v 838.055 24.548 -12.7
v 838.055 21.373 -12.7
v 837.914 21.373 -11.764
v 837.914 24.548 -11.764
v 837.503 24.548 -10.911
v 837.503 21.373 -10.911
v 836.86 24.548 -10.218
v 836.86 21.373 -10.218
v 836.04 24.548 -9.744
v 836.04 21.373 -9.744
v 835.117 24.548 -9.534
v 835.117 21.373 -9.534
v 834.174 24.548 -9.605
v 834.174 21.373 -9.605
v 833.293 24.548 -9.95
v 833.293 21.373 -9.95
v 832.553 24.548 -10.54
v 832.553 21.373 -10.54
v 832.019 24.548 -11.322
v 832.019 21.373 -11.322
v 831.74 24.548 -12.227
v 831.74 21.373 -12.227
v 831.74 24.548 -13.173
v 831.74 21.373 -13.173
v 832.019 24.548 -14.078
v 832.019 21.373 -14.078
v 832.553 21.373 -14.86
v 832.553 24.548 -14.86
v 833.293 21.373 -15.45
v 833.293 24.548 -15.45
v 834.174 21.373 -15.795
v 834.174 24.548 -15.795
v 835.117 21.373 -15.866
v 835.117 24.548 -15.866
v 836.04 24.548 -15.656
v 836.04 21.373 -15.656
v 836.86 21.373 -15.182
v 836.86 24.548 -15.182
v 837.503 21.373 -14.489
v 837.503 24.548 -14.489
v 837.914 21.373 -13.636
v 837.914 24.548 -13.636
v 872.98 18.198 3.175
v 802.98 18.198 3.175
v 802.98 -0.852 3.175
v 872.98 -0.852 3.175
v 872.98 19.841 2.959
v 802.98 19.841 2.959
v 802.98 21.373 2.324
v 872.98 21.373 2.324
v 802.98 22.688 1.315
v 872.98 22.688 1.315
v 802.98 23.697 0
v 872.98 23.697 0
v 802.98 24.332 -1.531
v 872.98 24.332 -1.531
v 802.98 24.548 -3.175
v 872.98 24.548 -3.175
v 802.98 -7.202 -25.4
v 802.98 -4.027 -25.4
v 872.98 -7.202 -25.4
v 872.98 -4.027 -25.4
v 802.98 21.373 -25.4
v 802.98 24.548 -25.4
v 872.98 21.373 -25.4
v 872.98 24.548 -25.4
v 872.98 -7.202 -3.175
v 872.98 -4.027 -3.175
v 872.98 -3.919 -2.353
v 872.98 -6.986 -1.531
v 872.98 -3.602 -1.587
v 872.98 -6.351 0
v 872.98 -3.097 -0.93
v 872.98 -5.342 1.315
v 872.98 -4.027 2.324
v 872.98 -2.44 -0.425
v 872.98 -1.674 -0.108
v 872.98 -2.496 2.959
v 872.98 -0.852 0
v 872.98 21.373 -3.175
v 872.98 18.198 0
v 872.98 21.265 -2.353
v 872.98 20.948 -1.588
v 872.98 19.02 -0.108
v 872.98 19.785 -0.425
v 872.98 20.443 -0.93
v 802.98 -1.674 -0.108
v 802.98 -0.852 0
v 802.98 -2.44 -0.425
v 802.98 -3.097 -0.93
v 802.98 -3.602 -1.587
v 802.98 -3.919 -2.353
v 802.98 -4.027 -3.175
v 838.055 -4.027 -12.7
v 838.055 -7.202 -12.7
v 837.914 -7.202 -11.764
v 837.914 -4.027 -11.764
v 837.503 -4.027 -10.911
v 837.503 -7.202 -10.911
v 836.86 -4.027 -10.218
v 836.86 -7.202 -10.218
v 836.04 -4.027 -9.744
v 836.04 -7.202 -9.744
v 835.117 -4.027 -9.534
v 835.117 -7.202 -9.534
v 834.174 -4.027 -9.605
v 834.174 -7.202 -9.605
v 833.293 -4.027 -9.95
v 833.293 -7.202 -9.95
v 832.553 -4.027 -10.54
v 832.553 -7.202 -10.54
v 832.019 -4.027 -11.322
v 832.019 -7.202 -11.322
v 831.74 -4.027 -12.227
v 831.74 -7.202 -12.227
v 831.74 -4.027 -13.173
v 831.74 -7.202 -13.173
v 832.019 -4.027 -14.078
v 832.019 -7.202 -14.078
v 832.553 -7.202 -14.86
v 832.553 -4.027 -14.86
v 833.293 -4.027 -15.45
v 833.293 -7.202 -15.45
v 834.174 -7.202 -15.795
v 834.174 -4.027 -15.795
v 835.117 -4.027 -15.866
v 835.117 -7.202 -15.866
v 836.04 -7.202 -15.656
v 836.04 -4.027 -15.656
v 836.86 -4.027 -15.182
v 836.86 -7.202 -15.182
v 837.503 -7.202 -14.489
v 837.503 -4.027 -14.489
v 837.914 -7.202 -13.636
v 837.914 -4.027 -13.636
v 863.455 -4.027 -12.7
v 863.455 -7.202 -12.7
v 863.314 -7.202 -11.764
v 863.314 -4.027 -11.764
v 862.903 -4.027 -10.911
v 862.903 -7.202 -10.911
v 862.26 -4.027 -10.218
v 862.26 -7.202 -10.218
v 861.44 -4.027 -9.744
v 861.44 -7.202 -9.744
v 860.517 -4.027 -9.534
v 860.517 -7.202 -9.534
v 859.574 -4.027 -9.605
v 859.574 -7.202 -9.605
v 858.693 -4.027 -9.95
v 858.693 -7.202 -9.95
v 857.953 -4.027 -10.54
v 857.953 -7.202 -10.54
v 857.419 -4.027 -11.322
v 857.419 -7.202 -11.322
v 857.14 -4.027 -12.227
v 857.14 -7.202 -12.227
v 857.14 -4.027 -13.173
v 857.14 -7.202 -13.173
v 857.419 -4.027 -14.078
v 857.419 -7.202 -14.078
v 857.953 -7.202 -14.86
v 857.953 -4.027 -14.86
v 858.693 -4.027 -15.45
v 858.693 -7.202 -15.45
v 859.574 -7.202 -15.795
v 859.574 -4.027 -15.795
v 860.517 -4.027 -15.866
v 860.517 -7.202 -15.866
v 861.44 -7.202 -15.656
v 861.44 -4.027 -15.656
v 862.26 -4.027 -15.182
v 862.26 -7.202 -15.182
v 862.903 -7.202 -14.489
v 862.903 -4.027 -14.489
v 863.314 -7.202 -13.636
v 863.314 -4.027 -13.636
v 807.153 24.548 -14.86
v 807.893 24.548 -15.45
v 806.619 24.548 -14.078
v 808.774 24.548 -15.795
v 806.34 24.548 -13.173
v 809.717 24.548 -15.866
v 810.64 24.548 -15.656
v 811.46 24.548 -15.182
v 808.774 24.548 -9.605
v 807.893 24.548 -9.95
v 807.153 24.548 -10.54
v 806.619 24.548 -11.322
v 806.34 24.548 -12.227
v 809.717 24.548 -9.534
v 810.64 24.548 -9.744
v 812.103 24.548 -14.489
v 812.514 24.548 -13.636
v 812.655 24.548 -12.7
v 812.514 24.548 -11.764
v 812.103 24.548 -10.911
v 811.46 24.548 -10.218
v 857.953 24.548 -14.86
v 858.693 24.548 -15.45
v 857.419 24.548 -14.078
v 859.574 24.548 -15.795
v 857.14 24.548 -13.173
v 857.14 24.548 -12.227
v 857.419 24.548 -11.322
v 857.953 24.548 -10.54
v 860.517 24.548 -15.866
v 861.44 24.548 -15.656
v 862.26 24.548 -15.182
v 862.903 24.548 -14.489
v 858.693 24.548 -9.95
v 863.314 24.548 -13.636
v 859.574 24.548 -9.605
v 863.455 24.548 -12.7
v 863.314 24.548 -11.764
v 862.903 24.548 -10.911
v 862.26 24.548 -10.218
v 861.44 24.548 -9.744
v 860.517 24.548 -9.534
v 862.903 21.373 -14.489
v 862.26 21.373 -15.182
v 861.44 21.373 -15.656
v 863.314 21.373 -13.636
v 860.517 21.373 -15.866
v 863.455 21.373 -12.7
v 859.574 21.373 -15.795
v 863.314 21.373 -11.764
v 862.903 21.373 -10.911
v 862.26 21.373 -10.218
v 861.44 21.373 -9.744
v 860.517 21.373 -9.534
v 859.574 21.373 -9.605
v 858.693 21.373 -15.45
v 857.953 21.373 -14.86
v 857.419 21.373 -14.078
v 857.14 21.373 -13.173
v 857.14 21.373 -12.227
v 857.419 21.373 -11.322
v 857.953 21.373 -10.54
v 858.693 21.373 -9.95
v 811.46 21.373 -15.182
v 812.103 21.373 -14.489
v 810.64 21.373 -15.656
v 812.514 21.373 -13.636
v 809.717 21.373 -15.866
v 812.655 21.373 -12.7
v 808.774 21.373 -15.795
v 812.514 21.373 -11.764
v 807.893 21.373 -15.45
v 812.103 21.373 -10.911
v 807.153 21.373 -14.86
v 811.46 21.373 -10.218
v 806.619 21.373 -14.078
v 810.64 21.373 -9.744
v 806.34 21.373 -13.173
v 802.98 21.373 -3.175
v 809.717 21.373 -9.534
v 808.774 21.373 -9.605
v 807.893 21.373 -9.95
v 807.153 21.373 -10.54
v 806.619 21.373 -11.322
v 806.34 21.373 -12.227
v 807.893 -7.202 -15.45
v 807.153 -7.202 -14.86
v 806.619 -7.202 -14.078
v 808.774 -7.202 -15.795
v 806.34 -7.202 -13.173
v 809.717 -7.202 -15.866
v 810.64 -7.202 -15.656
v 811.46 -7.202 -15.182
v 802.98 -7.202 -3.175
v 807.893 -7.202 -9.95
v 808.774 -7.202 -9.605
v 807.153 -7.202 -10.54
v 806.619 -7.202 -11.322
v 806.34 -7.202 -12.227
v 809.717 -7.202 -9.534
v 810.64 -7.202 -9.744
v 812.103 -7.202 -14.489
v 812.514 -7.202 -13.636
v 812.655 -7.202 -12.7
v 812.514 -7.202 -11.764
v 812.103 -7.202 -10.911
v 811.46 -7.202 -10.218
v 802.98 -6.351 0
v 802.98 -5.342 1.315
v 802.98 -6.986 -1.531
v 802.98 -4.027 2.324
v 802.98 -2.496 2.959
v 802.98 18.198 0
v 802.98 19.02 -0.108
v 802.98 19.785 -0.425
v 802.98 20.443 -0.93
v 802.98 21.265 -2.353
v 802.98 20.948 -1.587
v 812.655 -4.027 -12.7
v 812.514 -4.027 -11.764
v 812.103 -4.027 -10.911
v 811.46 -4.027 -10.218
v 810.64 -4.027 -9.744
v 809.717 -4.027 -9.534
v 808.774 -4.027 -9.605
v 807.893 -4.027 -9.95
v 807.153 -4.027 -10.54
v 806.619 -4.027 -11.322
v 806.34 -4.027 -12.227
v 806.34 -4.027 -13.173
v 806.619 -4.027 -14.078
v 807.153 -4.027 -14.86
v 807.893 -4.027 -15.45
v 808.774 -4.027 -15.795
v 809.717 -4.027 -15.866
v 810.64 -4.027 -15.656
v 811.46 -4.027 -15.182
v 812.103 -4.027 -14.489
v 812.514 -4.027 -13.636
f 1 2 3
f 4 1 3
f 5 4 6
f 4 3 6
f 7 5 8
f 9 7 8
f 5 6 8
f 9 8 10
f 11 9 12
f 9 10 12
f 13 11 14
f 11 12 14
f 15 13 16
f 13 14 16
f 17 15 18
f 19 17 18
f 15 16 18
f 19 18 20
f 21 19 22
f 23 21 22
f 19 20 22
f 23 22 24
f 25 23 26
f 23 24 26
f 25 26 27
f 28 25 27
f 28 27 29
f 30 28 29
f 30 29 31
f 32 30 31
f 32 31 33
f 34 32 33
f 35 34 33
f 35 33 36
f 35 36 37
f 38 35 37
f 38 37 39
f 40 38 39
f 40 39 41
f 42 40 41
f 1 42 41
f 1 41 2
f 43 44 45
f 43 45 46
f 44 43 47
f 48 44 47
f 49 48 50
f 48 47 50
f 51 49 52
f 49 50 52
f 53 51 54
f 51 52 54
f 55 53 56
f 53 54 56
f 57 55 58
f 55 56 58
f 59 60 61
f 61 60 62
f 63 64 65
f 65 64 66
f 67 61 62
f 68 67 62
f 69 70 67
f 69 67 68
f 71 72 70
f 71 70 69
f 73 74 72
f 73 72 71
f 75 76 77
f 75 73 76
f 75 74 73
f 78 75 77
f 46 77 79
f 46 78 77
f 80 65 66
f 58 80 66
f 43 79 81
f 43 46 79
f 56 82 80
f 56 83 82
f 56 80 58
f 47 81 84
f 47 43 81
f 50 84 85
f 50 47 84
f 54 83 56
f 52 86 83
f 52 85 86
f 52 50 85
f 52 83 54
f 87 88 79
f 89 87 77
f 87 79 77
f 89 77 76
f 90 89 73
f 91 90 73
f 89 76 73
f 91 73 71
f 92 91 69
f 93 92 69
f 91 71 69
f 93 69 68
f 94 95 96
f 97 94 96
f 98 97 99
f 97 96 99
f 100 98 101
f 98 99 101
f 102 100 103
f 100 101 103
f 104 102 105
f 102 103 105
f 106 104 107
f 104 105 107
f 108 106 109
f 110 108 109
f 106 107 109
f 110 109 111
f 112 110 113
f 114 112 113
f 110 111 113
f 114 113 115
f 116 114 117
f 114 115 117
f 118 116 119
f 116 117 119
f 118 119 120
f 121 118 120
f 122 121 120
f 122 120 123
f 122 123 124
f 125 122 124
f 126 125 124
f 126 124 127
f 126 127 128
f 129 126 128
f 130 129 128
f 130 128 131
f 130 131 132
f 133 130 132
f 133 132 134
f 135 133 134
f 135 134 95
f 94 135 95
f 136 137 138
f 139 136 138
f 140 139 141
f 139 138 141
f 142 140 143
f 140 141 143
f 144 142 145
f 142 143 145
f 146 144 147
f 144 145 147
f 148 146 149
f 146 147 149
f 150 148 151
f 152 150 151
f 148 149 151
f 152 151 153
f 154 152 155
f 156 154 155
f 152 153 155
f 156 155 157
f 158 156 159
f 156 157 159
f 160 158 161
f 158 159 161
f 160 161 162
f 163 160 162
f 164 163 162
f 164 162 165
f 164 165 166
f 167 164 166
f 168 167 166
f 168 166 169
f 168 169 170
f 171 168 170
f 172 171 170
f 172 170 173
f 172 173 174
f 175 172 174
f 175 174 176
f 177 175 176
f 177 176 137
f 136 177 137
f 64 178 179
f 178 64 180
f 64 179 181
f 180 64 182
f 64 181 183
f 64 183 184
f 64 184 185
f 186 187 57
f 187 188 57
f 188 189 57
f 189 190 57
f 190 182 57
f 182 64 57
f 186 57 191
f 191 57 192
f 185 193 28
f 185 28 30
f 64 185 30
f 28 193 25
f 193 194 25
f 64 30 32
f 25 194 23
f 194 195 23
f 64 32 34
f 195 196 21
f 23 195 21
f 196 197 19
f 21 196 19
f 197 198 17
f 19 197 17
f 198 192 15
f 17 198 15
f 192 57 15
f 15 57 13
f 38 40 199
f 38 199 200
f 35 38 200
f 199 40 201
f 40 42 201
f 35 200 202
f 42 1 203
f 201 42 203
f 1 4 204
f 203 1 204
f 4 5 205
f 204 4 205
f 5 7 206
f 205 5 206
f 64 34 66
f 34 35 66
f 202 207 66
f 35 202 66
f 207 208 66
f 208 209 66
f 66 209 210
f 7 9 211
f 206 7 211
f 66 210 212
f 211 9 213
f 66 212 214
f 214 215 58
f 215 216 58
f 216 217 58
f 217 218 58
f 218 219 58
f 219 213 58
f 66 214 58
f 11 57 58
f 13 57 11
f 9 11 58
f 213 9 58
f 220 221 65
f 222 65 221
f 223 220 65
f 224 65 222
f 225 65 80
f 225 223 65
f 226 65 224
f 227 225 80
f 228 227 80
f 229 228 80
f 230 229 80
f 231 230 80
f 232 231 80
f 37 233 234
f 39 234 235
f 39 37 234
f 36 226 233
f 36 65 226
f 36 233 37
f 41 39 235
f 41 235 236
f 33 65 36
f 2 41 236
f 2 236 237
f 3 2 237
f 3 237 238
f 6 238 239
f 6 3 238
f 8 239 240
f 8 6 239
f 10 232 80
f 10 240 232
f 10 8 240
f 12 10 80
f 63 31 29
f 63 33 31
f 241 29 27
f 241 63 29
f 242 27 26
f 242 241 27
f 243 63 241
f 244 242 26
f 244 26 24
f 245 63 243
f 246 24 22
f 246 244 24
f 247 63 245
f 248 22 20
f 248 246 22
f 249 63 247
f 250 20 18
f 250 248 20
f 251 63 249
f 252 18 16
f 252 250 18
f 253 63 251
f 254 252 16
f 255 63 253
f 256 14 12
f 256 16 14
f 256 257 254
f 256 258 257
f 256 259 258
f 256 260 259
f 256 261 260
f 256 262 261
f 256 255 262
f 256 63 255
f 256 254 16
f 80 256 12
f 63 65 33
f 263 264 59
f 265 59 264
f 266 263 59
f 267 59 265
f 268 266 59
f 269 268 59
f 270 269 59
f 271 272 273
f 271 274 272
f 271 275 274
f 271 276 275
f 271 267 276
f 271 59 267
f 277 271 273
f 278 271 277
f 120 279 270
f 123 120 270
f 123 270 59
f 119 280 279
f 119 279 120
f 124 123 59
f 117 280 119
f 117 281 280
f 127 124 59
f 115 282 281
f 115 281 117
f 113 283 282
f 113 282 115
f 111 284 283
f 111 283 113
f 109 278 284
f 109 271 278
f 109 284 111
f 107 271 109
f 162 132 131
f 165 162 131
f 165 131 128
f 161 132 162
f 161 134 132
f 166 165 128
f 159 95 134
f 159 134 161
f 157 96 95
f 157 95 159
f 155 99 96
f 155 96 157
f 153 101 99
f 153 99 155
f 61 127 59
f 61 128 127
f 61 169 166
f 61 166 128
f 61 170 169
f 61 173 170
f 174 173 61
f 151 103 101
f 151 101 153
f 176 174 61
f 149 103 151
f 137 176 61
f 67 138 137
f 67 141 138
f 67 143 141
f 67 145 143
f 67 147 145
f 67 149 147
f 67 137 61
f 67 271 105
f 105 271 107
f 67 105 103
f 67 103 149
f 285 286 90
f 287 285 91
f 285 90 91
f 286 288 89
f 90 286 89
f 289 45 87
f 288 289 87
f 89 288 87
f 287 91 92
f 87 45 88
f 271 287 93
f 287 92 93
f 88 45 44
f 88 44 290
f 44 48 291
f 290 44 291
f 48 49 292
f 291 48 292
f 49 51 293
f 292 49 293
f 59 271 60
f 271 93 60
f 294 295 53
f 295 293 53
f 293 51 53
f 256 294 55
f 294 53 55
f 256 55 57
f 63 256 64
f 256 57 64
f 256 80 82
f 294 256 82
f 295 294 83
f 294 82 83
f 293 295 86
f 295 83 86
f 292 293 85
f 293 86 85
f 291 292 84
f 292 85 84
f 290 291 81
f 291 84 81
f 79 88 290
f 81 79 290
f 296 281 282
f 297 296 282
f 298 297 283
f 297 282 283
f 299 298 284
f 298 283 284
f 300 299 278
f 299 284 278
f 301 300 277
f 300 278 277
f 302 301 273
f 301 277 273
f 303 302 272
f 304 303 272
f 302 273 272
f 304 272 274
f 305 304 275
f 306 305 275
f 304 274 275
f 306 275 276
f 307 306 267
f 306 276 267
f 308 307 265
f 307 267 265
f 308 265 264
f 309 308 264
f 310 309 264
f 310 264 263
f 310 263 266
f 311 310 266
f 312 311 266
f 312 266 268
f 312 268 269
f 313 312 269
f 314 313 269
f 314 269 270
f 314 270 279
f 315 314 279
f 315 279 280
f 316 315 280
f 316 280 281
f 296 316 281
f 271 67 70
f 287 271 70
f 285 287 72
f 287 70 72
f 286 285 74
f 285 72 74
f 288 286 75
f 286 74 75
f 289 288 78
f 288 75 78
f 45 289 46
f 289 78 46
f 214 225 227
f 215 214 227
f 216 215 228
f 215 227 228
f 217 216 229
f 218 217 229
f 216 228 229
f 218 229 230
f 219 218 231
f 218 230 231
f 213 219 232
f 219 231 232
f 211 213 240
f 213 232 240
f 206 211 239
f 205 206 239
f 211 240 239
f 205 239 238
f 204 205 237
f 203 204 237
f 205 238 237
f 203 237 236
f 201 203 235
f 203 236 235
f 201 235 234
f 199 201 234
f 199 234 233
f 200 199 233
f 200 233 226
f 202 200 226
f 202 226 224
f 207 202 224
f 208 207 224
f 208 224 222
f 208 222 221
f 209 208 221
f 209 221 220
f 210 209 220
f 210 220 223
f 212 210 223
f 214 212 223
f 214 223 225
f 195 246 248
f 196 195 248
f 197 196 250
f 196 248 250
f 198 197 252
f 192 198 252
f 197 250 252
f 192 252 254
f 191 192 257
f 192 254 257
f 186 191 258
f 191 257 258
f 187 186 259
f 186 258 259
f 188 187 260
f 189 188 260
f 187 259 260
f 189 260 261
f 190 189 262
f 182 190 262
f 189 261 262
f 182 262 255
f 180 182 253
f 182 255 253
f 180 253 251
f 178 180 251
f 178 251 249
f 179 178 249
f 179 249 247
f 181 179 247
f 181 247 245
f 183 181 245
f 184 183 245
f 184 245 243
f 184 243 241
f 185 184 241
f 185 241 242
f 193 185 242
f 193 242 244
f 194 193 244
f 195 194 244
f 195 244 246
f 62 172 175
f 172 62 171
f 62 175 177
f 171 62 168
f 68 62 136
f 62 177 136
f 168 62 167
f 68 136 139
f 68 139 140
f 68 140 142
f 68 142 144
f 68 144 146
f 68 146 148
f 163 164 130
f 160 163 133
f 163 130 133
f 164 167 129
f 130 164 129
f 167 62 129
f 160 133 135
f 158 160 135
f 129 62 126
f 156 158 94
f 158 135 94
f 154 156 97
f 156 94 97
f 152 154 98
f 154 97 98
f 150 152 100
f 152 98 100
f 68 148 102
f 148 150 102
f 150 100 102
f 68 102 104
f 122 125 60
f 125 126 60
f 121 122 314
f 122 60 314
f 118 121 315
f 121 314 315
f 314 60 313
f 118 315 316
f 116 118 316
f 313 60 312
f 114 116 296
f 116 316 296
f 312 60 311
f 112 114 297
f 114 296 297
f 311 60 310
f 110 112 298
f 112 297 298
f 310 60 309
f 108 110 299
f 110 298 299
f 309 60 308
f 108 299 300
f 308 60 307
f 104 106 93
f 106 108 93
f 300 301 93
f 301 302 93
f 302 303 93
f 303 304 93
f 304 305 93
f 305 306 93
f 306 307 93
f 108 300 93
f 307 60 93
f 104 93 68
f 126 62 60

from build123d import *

# Parameters (mm, degrees)
SKETCH1_W          = 889
SKETCH1_H          = 31.75
EXTRUDE1_DEPTH     = 28.575
EXTRUDE2_REACH     = 891.702
SKETCH2_W          = 25.4
SKETCH2_H          = 25.4
HOLE1_D            = 6.35
HOLE1_DEPTH        = 3.175
LPATTERN1_COUNT    = 35
LPATTERN1_PITCH    = 25.4
HOLE2_D            = 9.652
LPATTERN2_COUNT    = 12
LPATTERN2_PITCH    = 25.4
HOLE3_D            = 9.652
HOLE4_D            = 9.652
LPATTERN3_COUNT    = 12
LPATTERN3_PITCH    = 25.4
HOLE5_D            = 3.175
HOLE6_D            = 6.35
LPATTERN4_COUNT    = 35
LPATTERN4_PITCH    = 25.4
FILLET1_R          = 3.175
FILLET2_R          = 3.175
FILLET3_R          = 6.35
FILLET4_R          = 6.35
SKETCH16_W         = 145.760071232
SKETCH16_H         = 71.504803879
CUT_EXTRUDE2_DEPTH = 75
SKETCH17_W         = 473.628565651
SKETCH17_H         = 66.908943447
CUT_EXTRUDE3_DEPTH = 186
SKETCH18_W         = 373.094897193
SKETCH18_H         = 93.915816603
CUT_EXTRUDE4_DEPTH = 186


with BuildPart() as part:
    # Sketch1 → Extrude1 (new body)
    with BuildSketch(Plane.XY.offset(3.175)):
        with Locations((428.480011997, 8.672957166)):
            Rectangle(SKETCH1_W, SKETCH1_H)
    extrude(amount=-EXTRUDE1_DEPTH)

    # Sketch2 → Extrude2 (cut, up to next)
    with BuildSketch(Plane.ZY.offset(16.019988003), mode=Mode.PRIVATE) as extrude2_sk1:
        with Locations((-12.7, 8.672957166)):
            Rectangle(SKETCH2_W, SKETCH2_H)
    extrude2_tool1 = extrude(extrude2_sk1.sketch, amount=-EXTRUDE2_REACH, mode=Mode.PRIVATE) & part.part
    add(extrude2_tool1.solids().sort_by_distance((-16.019988, 8.672957, -12.7))[0], mode=Mode.SUBTRACT)

    # Hole1
    with Locations(Plane(origin=(0, 24.547957166, 0), x_dir=(-1, 0, 0), z_dir=(0, 1, 0))):
        with Locations((3.319988003, -12.7)):
            hole1 = Hole(HOLE1_D / 2, depth=HOLE1_DEPTH)

    # LPattern1: Hole1 ×35
    with Locations(*[(i * LPATTERN1_PITCH, 0, 0) for i in range(1, LPATTERN1_COUNT)]):
        add(hole1, mode=Mode.SUBTRACT)

    # Hole2 (through all)
    with Locations(Plane.XY.offset(3.175)):
        with Locations((66.530011997, 10.577957166)):
            hole2 = Hole(HOLE2_D / 2)

    # LPattern2: Hole2 ×12, 8 skipped
    with Locations(*[(i * LPATTERN2_PITCH, 0, 0) for i in range(1, LPATTERN2_COUNT) if i not in (2, 3, 4, 5, 6, 7, 8, 9)]):
        add(hole2, mode=Mode.SUBTRACT)

    # Hole3 (through all)
    with Locations(Plane.XY.offset(3.175)):
        with Locations((428.480011997, 6.767957166)):
            Hole(HOLE3_D / 2)

    # Hole4 (through all)
    with Locations(Plane.XY.offset(3.175)):
        with Locations((511.030011997, 10.577957166)):
            hole4 = Hole(HOLE4_D / 2)

    # LPattern3: Hole4 ×12, 8 skipped
    with Locations(*[(i * LPATTERN3_PITCH, 0, 0) for i in range(1, LPATTERN3_COUNT) if i not in (2, 3, 4, 5, 6, 7, 8, 9)]):
        add(hole4, mode=Mode.SUBTRACT)

    # Hole5 (through all)
    with Locations(Plane.XY.offset(3.175)):
        with Locations((669.780011997, 8.672957166)):
            Hole(HOLE5_D / 2)

    # Hole6 (through all)
    with Locations(Plane(origin=(0, -4.027042834, 0), x_dir=(-1, 0, 0), z_dir=(0, 1, 0))):
        with Locations((3.319988003, -12.7)):
            hole6 = Hole(HOLE6_D / 2)

    # LPattern4: Hole6 ×35
    with Locations(*[(i * LPATTERN4_PITCH, 0, 0) for i in range(1, LPATTERN4_COUNT)]):
        add(hole6, mode=Mode.SUBTRACT)

    # Fillet1
    fillet1_edges = [part.edges().sort_by_distance(p)[0] for p in [
        (428.480011997, 21.372957166, 0),
    ]]
    fillet(fillet1_edges, radius=FILLET1_R)

    # Fillet2
    fillet2_edges = [part.edges().sort_by_distance(p)[0] for p in [
        (428.480011997, -4.027042834, 0),
    ]]
    fillet(fillet2_edges, radius=FILLET2_R)

    # Fillet3
    fillet3_edges = [part.edges().sort_by_distance(p)[0] for p in [
        (428.480011997, -7.202042834, 3.175),
    ]]
    fillet(fillet3_edges, radius=FILLET3_R)

    # Fillet4
    fillet4_edges = [part.edges().sort_by_distance(p)[0] for p in [
        (428.480011997, 24.547957166, 3.175),
    ]]
    fillet(fillet4_edges, radius=FILLET4_R)

    # Sketch16 → Cut-Extrude2 (cut)
    with BuildSketch(Plane(origin=(0, 24.547957166, 0), x_dir=(1, 0, 0), z_dir=(0, 1, 0))):
        with Locations((40.099976381, -10.352401939)):
            Rectangle(SKETCH16_W, SKETCH16_H)
    extrude(amount=-CUT_EXTRUDE2_DEPTH, mode=Mode.SUBTRACT)

    # Sketch17 → Cut-Extrude3 (cut)
    with BuildSketch(Plane(origin=(0, 24.547957166, 0), x_dir=(1, 0, 0), z_dir=(0, 1, 0))):
        with Locations((288.165729172, -8.054471723)):
            Rectangle(SKETCH17_W, SKETCH17_H)
    extrude(amount=-CUT_EXTRUDE3_DEPTH, mode=Mode.SUBTRACT)

    # Sketch18 → Cut-Extrude4 (cut)
    with BuildSketch(Plane(origin=(0, 24.547957166, 0), x_dir=(1, 0, 0), z_dir=(0, 1, 0))):
        with Locations((616.432563401, -21.557908301)):
            Rectangle(SKETCH18_W, SKETCH18_H)
    extrude(amount=-CUT_EXTRUDE4_DEPTH, mode=Mode.SUBTRACT)


solid = part.part
